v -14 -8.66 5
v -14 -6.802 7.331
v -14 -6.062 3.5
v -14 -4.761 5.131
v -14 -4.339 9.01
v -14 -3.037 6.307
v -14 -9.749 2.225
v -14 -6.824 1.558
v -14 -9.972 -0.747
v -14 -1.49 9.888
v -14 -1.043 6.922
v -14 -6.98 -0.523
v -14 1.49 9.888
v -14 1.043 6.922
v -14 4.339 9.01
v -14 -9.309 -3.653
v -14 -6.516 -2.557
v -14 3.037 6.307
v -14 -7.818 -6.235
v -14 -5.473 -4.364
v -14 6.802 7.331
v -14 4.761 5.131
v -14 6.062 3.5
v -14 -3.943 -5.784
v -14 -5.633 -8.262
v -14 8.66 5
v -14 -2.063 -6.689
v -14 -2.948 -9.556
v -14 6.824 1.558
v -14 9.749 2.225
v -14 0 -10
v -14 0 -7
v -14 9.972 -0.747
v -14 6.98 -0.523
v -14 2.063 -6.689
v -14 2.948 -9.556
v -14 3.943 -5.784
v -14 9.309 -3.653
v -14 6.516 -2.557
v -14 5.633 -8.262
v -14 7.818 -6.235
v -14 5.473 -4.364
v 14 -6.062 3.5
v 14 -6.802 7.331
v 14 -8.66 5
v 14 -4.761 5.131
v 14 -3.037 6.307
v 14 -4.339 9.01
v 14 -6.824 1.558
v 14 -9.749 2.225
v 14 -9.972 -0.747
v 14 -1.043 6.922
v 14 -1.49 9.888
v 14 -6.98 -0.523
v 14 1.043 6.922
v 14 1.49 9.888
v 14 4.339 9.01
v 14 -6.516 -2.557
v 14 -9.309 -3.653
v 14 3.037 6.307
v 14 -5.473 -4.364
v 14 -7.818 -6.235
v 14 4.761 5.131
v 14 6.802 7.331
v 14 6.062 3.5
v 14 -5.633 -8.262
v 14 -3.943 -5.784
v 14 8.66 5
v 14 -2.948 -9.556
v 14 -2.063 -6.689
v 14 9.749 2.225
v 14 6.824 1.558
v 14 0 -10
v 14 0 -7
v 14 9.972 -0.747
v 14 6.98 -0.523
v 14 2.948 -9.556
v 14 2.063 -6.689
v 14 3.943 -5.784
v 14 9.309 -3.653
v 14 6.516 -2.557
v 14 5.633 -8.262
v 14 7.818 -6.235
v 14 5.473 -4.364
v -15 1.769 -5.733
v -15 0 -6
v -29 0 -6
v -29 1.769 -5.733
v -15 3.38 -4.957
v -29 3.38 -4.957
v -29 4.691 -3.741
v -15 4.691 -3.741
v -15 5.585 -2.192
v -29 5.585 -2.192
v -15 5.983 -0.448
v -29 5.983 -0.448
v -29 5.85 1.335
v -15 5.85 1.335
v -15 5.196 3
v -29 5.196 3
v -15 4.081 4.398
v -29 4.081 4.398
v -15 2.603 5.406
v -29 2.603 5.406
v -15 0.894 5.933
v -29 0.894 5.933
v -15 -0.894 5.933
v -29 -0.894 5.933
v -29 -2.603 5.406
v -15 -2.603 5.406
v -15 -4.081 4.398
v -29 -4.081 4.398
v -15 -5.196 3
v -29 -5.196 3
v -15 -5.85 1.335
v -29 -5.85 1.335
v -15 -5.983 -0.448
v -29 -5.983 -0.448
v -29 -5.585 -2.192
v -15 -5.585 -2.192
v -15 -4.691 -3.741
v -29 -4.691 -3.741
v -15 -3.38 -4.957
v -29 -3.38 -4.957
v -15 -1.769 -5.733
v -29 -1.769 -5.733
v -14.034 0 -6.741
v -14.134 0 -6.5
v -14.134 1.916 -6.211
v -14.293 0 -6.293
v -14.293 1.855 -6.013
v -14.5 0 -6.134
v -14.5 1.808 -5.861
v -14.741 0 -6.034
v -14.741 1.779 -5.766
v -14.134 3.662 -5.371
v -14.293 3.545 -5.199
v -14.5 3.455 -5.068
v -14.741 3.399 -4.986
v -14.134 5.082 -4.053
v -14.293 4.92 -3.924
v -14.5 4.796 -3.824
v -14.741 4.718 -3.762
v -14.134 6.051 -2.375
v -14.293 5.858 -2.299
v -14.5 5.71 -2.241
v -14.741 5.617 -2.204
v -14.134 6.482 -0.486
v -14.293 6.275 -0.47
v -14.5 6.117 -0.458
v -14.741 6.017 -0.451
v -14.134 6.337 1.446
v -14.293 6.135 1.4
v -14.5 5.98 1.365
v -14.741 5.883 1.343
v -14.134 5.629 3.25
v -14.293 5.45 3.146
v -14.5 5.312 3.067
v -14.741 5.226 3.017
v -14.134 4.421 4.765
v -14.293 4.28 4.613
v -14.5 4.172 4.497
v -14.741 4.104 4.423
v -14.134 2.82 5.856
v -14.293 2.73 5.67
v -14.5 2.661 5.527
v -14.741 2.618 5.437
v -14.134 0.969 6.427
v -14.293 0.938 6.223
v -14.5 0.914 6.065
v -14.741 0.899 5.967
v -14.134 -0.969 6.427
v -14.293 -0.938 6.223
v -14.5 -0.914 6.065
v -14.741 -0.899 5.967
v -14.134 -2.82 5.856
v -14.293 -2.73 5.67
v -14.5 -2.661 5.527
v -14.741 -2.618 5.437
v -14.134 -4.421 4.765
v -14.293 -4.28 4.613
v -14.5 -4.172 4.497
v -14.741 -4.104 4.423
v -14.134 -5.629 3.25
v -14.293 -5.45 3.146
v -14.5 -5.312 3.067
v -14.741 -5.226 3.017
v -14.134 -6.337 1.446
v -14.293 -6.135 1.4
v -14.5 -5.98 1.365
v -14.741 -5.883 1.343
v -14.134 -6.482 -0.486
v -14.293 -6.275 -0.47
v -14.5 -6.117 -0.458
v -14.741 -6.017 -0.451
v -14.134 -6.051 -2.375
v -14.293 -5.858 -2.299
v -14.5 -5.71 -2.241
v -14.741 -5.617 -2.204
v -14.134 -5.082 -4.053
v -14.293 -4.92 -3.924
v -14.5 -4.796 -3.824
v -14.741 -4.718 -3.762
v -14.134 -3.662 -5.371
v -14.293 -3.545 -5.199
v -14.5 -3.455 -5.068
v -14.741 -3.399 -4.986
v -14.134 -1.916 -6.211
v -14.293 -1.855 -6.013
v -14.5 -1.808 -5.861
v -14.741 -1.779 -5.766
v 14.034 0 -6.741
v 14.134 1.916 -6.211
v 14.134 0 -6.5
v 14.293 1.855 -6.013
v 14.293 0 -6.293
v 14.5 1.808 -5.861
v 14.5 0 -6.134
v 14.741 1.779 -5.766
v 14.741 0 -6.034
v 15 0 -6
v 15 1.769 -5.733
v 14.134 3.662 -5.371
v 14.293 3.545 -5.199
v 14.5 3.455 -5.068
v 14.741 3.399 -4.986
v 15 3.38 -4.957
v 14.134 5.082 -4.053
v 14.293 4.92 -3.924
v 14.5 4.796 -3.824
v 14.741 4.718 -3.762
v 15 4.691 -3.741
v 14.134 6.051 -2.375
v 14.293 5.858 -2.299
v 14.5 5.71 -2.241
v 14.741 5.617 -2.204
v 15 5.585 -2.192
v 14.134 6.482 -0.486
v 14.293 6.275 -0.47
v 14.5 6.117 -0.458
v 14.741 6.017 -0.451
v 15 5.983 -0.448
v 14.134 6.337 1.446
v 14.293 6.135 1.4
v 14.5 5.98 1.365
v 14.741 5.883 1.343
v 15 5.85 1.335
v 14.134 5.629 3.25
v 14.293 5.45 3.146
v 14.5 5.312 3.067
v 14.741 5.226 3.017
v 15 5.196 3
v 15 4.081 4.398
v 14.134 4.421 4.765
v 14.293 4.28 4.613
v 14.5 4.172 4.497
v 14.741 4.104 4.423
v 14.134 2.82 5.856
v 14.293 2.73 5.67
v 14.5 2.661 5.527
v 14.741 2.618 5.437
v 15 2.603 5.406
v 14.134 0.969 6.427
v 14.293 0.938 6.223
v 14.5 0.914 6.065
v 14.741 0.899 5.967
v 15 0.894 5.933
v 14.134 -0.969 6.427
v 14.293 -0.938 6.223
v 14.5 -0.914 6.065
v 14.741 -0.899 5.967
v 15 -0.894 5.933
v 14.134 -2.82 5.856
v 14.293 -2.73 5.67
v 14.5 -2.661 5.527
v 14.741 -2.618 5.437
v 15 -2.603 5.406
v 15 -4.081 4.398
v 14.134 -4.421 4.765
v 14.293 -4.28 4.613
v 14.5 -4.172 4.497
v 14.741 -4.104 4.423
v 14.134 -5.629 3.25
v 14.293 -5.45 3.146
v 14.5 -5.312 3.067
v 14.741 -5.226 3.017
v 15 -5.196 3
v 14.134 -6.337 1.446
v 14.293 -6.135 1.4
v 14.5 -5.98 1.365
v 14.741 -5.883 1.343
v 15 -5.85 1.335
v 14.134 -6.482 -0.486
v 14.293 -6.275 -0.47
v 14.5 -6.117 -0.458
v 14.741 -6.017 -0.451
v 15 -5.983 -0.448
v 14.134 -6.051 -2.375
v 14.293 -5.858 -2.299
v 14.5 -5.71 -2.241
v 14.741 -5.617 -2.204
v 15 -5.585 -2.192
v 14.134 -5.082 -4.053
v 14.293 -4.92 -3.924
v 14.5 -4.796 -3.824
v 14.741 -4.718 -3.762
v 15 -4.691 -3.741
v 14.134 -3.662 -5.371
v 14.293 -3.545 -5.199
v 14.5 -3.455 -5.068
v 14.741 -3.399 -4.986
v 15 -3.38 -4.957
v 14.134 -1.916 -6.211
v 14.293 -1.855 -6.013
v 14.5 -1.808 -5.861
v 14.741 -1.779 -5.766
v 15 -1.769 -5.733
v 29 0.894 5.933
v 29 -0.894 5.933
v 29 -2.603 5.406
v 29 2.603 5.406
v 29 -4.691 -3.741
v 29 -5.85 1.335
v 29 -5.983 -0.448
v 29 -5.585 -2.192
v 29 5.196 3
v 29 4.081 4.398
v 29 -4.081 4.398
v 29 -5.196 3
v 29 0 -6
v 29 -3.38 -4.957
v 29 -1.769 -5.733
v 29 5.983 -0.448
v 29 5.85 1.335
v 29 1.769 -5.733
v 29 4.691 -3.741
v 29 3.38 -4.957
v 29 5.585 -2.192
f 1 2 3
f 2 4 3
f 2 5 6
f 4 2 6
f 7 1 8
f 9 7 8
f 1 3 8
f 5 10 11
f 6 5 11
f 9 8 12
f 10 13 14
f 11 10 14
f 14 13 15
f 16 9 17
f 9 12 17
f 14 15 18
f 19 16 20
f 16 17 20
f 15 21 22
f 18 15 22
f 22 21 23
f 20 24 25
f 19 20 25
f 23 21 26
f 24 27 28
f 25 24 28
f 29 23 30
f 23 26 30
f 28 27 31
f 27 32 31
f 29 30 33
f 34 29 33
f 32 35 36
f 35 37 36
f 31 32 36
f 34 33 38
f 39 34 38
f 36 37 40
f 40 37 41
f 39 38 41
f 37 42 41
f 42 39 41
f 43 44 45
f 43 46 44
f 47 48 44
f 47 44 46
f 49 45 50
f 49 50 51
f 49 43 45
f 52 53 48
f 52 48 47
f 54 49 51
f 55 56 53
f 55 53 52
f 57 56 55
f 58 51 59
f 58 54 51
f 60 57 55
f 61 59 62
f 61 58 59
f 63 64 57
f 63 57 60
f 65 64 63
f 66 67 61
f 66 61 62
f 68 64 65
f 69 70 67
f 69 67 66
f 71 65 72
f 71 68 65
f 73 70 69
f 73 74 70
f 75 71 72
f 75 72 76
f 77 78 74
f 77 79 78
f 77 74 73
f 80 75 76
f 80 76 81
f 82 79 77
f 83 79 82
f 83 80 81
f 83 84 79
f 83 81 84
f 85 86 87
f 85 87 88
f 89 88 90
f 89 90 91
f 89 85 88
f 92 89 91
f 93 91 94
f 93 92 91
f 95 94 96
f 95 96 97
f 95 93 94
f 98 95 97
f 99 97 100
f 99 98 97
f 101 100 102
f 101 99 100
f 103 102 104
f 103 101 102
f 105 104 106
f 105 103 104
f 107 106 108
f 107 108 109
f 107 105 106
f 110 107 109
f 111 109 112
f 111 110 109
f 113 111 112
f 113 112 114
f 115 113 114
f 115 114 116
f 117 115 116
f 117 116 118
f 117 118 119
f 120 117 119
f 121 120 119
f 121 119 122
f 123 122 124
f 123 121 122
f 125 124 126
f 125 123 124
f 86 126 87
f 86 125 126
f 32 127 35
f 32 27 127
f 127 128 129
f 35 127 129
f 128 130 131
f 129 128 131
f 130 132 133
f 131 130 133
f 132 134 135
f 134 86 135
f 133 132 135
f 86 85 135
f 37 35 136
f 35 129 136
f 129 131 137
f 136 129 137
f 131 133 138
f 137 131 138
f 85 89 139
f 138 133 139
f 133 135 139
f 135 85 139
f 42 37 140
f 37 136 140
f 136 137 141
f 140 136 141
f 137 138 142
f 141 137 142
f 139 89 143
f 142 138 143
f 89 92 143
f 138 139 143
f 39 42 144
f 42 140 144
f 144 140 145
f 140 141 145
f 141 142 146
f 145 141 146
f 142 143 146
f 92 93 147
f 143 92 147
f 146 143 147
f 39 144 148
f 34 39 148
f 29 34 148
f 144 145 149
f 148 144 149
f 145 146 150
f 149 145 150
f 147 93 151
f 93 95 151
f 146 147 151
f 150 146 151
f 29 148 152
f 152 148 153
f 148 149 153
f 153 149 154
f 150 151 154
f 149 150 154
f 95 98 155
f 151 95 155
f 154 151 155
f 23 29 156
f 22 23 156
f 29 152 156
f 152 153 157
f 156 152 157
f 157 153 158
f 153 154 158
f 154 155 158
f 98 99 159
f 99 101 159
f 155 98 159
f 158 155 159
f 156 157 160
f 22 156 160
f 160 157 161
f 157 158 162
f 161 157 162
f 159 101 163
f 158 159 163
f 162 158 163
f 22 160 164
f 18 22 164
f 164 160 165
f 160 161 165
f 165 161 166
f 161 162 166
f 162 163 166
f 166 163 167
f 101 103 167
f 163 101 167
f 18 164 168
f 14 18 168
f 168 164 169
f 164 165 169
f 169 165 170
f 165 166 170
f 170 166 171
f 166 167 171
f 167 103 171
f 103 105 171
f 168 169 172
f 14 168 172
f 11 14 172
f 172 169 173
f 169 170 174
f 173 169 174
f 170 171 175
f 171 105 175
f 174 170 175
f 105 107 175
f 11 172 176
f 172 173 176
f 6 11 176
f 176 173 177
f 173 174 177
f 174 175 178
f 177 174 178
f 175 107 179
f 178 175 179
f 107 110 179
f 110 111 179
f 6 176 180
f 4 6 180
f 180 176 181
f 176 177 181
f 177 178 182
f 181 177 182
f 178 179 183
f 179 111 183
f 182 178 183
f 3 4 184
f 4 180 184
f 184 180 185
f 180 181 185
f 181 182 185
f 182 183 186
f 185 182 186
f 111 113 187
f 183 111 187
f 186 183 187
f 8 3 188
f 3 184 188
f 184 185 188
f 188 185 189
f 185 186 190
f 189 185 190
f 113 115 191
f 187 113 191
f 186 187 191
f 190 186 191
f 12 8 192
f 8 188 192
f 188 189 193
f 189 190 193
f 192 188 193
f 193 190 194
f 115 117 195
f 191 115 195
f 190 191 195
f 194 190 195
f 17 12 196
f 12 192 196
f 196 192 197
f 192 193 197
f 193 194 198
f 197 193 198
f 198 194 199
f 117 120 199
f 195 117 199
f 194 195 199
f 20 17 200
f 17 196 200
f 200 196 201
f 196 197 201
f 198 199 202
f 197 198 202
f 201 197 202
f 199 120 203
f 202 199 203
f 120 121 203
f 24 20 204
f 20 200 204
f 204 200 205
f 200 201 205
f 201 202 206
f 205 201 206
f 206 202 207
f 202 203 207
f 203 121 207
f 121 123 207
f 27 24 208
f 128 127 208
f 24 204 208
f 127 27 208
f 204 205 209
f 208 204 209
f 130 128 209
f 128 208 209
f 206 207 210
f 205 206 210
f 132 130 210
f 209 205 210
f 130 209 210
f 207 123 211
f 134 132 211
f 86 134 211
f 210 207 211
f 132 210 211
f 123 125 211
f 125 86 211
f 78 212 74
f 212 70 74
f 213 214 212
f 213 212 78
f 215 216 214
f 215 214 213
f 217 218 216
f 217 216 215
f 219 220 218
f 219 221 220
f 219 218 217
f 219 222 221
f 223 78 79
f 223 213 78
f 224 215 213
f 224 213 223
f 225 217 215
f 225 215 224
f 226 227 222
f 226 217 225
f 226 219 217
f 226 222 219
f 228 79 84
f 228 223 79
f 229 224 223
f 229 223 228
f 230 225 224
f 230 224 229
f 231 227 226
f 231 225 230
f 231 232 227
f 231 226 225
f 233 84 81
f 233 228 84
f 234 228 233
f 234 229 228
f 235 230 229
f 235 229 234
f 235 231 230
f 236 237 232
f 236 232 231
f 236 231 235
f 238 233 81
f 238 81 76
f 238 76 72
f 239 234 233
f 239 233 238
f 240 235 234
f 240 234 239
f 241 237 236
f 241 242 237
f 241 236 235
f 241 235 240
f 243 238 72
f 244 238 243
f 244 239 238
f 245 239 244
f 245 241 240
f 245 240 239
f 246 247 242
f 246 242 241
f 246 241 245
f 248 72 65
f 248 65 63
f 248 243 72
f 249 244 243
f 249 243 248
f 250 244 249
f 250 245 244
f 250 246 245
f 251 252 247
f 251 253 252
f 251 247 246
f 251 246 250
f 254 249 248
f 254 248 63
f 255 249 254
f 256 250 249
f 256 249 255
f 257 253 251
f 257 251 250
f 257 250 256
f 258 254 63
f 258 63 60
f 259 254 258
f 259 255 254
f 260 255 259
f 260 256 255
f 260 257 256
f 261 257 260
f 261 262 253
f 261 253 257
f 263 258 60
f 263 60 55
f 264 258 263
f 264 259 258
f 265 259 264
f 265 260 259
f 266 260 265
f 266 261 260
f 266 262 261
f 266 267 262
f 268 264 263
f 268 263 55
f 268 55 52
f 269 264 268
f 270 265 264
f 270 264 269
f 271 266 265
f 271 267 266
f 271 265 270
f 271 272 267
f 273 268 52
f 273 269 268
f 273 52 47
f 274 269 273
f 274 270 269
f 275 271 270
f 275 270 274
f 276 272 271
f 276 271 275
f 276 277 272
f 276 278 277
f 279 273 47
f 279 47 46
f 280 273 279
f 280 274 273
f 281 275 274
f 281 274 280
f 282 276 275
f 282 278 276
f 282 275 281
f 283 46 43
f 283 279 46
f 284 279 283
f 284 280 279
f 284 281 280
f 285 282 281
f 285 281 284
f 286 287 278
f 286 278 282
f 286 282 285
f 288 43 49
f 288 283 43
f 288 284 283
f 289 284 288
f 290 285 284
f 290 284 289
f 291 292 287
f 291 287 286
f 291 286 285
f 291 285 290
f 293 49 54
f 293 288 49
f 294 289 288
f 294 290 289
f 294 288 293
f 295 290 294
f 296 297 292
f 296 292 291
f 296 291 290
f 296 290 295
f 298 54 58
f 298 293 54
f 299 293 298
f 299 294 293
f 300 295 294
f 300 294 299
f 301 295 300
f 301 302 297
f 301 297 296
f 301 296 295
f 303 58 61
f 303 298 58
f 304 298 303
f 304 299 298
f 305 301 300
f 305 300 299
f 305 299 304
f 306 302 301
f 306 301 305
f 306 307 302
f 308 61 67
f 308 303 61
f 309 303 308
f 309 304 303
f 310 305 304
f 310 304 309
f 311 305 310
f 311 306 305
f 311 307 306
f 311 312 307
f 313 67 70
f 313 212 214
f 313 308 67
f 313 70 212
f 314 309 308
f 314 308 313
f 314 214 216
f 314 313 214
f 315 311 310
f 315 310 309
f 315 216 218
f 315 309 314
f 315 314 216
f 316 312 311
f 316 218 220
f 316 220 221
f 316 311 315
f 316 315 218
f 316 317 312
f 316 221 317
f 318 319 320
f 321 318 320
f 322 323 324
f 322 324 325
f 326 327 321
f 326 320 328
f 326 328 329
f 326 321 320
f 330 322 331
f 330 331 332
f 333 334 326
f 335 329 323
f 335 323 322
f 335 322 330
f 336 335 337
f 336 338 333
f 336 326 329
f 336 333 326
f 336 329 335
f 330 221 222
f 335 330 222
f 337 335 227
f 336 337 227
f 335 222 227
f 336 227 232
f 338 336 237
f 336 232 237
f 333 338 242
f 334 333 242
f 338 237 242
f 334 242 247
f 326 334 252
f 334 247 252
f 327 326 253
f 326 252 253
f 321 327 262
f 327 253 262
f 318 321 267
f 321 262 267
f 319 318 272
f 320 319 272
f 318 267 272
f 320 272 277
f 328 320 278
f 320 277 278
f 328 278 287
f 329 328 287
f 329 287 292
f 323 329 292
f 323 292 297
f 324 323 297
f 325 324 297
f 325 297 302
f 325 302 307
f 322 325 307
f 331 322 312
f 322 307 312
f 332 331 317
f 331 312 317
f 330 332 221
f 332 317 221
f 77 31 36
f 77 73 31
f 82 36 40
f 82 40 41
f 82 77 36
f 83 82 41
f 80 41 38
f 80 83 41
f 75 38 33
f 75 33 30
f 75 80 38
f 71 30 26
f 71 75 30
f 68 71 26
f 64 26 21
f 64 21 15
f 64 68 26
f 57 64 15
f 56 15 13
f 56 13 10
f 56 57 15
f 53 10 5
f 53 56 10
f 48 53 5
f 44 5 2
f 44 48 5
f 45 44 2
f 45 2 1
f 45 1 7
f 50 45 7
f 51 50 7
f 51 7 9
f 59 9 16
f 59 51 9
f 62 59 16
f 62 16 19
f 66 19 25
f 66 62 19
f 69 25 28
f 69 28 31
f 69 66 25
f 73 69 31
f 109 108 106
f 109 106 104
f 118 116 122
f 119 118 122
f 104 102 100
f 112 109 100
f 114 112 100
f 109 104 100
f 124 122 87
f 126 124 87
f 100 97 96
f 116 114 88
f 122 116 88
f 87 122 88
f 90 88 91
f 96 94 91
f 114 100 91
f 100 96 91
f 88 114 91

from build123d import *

# Parameters (mm, degrees)
SKETCH1_R           = 10
BOSS_EXTRUDE1_DEPTH = 14
SKETCH_1_R          = 6
EXTRUDE_1_DEPTH     = 15
FILLET_1_R          = 1


with BuildPart() as part:
    # Sketch1 → Boss-Extrude1 (new body, symmetric)
    with BuildSketch(Plane(origin=(0, 0, 0), x_dir=(0, 0, -1), z_dir=(1, 0, 0))):
        Circle(SKETCH1_R)
    extrude(amount=BOSS_EXTRUDE1_DEPTH, both=True)

    # 草图1 → 凸台-拉伸1 (add)
    with BuildSketch(Plane(origin=(14, 0, 0), x_dir=(0, 0, -1), z_dir=(1, 0, 0))):
        Circle(SKETCH_1_R)
    extrude_1 = extrude(amount=EXTRUDE_1_DEPTH)

    # 镜向1: 凸台-拉伸1 across plane
    add(extrude_1.mirror(Plane(origin=(0, 0, 0), x_dir=(0, 0, 1), z_dir=(1, 0, 0))))

    # 圆角1
    fillet_1_edges = [part.edges().sort_by_distance(p)[0] for p in [
        (-14, 0, 6),
        (14, 0, 6),
    ]]
    fillet(fillet_1_edges, radius=FILLET_1_R)


solid = part.part
